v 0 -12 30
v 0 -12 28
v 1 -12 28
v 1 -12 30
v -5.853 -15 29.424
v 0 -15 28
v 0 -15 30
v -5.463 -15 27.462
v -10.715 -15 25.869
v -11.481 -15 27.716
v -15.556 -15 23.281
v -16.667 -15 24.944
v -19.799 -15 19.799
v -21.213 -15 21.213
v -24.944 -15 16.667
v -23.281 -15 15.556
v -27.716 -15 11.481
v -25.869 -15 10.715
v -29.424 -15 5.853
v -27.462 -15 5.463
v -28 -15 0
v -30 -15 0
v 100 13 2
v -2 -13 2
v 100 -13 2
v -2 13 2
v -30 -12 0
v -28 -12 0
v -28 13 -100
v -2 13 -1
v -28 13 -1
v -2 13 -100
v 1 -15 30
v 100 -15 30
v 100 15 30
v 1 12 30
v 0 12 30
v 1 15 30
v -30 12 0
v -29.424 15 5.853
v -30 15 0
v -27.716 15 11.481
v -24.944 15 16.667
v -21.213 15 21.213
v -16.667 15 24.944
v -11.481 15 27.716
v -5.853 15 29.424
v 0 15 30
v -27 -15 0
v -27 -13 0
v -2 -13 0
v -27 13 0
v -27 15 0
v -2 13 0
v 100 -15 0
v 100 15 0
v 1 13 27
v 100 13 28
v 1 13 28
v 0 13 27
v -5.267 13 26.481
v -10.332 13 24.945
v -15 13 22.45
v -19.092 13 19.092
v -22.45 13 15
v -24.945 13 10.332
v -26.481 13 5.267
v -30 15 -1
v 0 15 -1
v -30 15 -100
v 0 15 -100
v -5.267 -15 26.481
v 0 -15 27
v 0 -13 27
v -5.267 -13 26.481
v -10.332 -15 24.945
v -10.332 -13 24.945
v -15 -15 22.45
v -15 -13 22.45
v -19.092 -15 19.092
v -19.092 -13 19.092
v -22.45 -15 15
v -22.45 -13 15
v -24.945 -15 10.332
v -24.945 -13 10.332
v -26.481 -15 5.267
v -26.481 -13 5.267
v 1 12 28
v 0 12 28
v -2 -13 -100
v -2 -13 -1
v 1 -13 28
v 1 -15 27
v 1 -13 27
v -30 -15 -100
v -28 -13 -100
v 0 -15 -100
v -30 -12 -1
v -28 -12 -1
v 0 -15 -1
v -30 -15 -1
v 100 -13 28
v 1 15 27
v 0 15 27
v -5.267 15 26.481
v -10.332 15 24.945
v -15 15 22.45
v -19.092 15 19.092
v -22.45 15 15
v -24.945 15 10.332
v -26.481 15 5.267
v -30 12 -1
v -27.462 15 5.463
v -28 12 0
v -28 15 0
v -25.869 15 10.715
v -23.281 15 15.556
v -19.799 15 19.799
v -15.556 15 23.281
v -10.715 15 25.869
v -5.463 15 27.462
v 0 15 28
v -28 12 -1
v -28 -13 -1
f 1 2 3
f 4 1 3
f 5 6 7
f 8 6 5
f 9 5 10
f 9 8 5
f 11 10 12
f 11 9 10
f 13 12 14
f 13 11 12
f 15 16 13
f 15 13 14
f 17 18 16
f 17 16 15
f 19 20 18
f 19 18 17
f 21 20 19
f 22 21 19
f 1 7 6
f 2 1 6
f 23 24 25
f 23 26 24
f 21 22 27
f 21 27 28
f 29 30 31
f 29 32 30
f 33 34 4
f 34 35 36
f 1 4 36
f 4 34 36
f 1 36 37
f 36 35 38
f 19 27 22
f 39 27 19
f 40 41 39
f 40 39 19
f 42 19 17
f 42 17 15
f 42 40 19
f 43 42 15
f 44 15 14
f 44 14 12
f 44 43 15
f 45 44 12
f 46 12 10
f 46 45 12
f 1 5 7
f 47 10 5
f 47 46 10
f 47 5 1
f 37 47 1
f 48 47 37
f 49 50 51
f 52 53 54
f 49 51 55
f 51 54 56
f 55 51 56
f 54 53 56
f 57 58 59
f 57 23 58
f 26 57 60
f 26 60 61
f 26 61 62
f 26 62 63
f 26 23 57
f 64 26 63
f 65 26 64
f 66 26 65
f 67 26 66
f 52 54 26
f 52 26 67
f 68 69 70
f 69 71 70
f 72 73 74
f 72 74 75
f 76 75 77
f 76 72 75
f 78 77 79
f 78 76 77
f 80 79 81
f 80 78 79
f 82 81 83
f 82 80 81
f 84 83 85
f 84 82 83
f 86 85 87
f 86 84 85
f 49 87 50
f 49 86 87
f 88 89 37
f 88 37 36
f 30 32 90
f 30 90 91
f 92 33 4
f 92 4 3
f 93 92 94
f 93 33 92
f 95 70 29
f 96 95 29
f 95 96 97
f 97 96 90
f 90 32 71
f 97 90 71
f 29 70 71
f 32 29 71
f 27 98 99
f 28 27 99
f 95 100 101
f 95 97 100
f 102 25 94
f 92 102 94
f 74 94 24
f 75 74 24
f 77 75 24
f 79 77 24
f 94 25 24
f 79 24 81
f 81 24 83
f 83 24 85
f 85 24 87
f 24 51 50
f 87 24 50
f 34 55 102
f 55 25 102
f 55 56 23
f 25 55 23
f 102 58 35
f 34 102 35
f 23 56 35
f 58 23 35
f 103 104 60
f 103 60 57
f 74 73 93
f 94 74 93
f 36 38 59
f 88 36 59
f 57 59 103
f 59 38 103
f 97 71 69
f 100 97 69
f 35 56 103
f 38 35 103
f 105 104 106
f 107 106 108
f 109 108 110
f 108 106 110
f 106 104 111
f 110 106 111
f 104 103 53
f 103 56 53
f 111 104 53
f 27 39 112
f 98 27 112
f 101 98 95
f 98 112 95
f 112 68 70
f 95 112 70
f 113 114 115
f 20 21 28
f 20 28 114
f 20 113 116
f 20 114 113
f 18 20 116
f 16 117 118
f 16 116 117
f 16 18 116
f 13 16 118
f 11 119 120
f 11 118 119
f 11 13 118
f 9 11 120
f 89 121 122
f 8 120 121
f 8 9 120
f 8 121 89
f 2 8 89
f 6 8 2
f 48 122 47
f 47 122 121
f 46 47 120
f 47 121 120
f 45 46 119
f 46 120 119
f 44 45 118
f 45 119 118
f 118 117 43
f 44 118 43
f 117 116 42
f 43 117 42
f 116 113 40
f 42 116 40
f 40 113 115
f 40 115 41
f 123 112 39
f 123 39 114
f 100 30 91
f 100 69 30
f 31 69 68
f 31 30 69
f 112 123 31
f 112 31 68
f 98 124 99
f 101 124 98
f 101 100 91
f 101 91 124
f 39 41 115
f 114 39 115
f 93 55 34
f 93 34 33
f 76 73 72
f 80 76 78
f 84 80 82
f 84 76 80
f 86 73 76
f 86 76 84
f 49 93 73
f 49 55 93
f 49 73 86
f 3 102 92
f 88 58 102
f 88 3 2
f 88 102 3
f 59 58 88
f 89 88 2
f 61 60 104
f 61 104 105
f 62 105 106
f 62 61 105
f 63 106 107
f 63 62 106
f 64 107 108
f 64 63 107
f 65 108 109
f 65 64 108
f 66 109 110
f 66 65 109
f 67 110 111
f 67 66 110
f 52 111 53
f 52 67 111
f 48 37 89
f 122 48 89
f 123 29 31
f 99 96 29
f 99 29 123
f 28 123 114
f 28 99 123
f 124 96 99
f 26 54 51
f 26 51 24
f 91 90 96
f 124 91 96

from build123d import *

# Parameters (mm, degrees)
EXTRUDE_1_DEPTH          = 15
FILLET_1_R               = 30
SHELL_1_T                = -2
CUT_EXTRUDE_1_DEPTH      = 145.568322948
CUT_EXTRUDE_1_DEPTH_BACK = 145.568322948
SKETCH_3_W               = 2
SKETCH_3_H               = 1
SKETCH_3_W_2             = 1
SKETCH_3_H_2             = 3
CUT_EXTRUDE_2_DEPTH      = 3


with BuildPart() as part:
    # 草图1 → 拉伸-薄壁1 (new, symmetric)
    with BuildSketch(Plane(origin=(0, 0, 0), x_dir=(1, 0, 0), z_dir=(0, 1, 0))):
        Polygon((0, 100), (0, 0), (100, 0), (100, -30), (-30, -30), (-30, 100), align=None)
    extrude(amount=EXTRUDE_1_DEPTH, both=True)

    # 圆角1
    fillet_1_edges = [part.edges().sort_by_distance(p)[0] for p in [
        (-30, 0, 30),
    ]]
    fillet(fillet_1_edges, radius=FILLET_1_R)

    # 抽壳1
    shell_1_openings = [part.faces().sort_by_distance(p)[0] for p in [
        (100, 0, 15),
        (-15, 0, -100),
    ]]
    offset(amount=SHELL_1_T, openings=shell_1_openings, kind=Kind.INTERSECTION)

    # 草图2 → 切除-拉伸1 (cut, two sides: drawn at the far end of the back side and taken through both)
    with BuildSketch(Plane(origin=(0, 15, 0), x_dir=(1, 0, 0), z_dir=(0, 1, 0)).offset(-CUT_EXTRUDE_1_DEPTH_BACK)):
        with BuildLine():
            ThreePointArc((-28, 0), (-19.798989873, -19.798989873), (0, -28))
            Line((0, -28), (0, -27))
            ThreePointArc((0, -27), (-19.091883092, -19.091883092), (-27, 0))
            Line((-27, 0), (0, 0))
            Line((0, 0), (0, 1))
            Line((0, 1), (-28, 1))
            Line((-28, 1), (-28, 0))
        make_face()
    extrude(amount=CUT_EXTRUDE_1_DEPTH + CUT_EXTRUDE_1_DEPTH_BACK, mode=Mode.SUBTRACT)

    # 草图3 → 切除-拉伸2 (cut)
    with BuildSketch(Plane(origin=(0, 15, 0), x_dir=(1, 0, 0), z_dir=(0, 1, 0))):
        with Locations((-29, 0.5)):
            Rectangle(SKETCH_3_W, SKETCH_3_H)
        with Locations((0.5, -28.5)):
            Rectangle(SKETCH_3_W_2, SKETCH_3_H_2)
    cut_extrude_2 = extrude(amount=-CUT_EXTRUDE_2_DEPTH, mode=Mode.SUBTRACT)

    # 镜向1: 切除-拉伸2 across plane
    add(cut_extrude_2.mirror(Plane.ZX), mode=Mode.SUBTRACT)


solid = part.part
